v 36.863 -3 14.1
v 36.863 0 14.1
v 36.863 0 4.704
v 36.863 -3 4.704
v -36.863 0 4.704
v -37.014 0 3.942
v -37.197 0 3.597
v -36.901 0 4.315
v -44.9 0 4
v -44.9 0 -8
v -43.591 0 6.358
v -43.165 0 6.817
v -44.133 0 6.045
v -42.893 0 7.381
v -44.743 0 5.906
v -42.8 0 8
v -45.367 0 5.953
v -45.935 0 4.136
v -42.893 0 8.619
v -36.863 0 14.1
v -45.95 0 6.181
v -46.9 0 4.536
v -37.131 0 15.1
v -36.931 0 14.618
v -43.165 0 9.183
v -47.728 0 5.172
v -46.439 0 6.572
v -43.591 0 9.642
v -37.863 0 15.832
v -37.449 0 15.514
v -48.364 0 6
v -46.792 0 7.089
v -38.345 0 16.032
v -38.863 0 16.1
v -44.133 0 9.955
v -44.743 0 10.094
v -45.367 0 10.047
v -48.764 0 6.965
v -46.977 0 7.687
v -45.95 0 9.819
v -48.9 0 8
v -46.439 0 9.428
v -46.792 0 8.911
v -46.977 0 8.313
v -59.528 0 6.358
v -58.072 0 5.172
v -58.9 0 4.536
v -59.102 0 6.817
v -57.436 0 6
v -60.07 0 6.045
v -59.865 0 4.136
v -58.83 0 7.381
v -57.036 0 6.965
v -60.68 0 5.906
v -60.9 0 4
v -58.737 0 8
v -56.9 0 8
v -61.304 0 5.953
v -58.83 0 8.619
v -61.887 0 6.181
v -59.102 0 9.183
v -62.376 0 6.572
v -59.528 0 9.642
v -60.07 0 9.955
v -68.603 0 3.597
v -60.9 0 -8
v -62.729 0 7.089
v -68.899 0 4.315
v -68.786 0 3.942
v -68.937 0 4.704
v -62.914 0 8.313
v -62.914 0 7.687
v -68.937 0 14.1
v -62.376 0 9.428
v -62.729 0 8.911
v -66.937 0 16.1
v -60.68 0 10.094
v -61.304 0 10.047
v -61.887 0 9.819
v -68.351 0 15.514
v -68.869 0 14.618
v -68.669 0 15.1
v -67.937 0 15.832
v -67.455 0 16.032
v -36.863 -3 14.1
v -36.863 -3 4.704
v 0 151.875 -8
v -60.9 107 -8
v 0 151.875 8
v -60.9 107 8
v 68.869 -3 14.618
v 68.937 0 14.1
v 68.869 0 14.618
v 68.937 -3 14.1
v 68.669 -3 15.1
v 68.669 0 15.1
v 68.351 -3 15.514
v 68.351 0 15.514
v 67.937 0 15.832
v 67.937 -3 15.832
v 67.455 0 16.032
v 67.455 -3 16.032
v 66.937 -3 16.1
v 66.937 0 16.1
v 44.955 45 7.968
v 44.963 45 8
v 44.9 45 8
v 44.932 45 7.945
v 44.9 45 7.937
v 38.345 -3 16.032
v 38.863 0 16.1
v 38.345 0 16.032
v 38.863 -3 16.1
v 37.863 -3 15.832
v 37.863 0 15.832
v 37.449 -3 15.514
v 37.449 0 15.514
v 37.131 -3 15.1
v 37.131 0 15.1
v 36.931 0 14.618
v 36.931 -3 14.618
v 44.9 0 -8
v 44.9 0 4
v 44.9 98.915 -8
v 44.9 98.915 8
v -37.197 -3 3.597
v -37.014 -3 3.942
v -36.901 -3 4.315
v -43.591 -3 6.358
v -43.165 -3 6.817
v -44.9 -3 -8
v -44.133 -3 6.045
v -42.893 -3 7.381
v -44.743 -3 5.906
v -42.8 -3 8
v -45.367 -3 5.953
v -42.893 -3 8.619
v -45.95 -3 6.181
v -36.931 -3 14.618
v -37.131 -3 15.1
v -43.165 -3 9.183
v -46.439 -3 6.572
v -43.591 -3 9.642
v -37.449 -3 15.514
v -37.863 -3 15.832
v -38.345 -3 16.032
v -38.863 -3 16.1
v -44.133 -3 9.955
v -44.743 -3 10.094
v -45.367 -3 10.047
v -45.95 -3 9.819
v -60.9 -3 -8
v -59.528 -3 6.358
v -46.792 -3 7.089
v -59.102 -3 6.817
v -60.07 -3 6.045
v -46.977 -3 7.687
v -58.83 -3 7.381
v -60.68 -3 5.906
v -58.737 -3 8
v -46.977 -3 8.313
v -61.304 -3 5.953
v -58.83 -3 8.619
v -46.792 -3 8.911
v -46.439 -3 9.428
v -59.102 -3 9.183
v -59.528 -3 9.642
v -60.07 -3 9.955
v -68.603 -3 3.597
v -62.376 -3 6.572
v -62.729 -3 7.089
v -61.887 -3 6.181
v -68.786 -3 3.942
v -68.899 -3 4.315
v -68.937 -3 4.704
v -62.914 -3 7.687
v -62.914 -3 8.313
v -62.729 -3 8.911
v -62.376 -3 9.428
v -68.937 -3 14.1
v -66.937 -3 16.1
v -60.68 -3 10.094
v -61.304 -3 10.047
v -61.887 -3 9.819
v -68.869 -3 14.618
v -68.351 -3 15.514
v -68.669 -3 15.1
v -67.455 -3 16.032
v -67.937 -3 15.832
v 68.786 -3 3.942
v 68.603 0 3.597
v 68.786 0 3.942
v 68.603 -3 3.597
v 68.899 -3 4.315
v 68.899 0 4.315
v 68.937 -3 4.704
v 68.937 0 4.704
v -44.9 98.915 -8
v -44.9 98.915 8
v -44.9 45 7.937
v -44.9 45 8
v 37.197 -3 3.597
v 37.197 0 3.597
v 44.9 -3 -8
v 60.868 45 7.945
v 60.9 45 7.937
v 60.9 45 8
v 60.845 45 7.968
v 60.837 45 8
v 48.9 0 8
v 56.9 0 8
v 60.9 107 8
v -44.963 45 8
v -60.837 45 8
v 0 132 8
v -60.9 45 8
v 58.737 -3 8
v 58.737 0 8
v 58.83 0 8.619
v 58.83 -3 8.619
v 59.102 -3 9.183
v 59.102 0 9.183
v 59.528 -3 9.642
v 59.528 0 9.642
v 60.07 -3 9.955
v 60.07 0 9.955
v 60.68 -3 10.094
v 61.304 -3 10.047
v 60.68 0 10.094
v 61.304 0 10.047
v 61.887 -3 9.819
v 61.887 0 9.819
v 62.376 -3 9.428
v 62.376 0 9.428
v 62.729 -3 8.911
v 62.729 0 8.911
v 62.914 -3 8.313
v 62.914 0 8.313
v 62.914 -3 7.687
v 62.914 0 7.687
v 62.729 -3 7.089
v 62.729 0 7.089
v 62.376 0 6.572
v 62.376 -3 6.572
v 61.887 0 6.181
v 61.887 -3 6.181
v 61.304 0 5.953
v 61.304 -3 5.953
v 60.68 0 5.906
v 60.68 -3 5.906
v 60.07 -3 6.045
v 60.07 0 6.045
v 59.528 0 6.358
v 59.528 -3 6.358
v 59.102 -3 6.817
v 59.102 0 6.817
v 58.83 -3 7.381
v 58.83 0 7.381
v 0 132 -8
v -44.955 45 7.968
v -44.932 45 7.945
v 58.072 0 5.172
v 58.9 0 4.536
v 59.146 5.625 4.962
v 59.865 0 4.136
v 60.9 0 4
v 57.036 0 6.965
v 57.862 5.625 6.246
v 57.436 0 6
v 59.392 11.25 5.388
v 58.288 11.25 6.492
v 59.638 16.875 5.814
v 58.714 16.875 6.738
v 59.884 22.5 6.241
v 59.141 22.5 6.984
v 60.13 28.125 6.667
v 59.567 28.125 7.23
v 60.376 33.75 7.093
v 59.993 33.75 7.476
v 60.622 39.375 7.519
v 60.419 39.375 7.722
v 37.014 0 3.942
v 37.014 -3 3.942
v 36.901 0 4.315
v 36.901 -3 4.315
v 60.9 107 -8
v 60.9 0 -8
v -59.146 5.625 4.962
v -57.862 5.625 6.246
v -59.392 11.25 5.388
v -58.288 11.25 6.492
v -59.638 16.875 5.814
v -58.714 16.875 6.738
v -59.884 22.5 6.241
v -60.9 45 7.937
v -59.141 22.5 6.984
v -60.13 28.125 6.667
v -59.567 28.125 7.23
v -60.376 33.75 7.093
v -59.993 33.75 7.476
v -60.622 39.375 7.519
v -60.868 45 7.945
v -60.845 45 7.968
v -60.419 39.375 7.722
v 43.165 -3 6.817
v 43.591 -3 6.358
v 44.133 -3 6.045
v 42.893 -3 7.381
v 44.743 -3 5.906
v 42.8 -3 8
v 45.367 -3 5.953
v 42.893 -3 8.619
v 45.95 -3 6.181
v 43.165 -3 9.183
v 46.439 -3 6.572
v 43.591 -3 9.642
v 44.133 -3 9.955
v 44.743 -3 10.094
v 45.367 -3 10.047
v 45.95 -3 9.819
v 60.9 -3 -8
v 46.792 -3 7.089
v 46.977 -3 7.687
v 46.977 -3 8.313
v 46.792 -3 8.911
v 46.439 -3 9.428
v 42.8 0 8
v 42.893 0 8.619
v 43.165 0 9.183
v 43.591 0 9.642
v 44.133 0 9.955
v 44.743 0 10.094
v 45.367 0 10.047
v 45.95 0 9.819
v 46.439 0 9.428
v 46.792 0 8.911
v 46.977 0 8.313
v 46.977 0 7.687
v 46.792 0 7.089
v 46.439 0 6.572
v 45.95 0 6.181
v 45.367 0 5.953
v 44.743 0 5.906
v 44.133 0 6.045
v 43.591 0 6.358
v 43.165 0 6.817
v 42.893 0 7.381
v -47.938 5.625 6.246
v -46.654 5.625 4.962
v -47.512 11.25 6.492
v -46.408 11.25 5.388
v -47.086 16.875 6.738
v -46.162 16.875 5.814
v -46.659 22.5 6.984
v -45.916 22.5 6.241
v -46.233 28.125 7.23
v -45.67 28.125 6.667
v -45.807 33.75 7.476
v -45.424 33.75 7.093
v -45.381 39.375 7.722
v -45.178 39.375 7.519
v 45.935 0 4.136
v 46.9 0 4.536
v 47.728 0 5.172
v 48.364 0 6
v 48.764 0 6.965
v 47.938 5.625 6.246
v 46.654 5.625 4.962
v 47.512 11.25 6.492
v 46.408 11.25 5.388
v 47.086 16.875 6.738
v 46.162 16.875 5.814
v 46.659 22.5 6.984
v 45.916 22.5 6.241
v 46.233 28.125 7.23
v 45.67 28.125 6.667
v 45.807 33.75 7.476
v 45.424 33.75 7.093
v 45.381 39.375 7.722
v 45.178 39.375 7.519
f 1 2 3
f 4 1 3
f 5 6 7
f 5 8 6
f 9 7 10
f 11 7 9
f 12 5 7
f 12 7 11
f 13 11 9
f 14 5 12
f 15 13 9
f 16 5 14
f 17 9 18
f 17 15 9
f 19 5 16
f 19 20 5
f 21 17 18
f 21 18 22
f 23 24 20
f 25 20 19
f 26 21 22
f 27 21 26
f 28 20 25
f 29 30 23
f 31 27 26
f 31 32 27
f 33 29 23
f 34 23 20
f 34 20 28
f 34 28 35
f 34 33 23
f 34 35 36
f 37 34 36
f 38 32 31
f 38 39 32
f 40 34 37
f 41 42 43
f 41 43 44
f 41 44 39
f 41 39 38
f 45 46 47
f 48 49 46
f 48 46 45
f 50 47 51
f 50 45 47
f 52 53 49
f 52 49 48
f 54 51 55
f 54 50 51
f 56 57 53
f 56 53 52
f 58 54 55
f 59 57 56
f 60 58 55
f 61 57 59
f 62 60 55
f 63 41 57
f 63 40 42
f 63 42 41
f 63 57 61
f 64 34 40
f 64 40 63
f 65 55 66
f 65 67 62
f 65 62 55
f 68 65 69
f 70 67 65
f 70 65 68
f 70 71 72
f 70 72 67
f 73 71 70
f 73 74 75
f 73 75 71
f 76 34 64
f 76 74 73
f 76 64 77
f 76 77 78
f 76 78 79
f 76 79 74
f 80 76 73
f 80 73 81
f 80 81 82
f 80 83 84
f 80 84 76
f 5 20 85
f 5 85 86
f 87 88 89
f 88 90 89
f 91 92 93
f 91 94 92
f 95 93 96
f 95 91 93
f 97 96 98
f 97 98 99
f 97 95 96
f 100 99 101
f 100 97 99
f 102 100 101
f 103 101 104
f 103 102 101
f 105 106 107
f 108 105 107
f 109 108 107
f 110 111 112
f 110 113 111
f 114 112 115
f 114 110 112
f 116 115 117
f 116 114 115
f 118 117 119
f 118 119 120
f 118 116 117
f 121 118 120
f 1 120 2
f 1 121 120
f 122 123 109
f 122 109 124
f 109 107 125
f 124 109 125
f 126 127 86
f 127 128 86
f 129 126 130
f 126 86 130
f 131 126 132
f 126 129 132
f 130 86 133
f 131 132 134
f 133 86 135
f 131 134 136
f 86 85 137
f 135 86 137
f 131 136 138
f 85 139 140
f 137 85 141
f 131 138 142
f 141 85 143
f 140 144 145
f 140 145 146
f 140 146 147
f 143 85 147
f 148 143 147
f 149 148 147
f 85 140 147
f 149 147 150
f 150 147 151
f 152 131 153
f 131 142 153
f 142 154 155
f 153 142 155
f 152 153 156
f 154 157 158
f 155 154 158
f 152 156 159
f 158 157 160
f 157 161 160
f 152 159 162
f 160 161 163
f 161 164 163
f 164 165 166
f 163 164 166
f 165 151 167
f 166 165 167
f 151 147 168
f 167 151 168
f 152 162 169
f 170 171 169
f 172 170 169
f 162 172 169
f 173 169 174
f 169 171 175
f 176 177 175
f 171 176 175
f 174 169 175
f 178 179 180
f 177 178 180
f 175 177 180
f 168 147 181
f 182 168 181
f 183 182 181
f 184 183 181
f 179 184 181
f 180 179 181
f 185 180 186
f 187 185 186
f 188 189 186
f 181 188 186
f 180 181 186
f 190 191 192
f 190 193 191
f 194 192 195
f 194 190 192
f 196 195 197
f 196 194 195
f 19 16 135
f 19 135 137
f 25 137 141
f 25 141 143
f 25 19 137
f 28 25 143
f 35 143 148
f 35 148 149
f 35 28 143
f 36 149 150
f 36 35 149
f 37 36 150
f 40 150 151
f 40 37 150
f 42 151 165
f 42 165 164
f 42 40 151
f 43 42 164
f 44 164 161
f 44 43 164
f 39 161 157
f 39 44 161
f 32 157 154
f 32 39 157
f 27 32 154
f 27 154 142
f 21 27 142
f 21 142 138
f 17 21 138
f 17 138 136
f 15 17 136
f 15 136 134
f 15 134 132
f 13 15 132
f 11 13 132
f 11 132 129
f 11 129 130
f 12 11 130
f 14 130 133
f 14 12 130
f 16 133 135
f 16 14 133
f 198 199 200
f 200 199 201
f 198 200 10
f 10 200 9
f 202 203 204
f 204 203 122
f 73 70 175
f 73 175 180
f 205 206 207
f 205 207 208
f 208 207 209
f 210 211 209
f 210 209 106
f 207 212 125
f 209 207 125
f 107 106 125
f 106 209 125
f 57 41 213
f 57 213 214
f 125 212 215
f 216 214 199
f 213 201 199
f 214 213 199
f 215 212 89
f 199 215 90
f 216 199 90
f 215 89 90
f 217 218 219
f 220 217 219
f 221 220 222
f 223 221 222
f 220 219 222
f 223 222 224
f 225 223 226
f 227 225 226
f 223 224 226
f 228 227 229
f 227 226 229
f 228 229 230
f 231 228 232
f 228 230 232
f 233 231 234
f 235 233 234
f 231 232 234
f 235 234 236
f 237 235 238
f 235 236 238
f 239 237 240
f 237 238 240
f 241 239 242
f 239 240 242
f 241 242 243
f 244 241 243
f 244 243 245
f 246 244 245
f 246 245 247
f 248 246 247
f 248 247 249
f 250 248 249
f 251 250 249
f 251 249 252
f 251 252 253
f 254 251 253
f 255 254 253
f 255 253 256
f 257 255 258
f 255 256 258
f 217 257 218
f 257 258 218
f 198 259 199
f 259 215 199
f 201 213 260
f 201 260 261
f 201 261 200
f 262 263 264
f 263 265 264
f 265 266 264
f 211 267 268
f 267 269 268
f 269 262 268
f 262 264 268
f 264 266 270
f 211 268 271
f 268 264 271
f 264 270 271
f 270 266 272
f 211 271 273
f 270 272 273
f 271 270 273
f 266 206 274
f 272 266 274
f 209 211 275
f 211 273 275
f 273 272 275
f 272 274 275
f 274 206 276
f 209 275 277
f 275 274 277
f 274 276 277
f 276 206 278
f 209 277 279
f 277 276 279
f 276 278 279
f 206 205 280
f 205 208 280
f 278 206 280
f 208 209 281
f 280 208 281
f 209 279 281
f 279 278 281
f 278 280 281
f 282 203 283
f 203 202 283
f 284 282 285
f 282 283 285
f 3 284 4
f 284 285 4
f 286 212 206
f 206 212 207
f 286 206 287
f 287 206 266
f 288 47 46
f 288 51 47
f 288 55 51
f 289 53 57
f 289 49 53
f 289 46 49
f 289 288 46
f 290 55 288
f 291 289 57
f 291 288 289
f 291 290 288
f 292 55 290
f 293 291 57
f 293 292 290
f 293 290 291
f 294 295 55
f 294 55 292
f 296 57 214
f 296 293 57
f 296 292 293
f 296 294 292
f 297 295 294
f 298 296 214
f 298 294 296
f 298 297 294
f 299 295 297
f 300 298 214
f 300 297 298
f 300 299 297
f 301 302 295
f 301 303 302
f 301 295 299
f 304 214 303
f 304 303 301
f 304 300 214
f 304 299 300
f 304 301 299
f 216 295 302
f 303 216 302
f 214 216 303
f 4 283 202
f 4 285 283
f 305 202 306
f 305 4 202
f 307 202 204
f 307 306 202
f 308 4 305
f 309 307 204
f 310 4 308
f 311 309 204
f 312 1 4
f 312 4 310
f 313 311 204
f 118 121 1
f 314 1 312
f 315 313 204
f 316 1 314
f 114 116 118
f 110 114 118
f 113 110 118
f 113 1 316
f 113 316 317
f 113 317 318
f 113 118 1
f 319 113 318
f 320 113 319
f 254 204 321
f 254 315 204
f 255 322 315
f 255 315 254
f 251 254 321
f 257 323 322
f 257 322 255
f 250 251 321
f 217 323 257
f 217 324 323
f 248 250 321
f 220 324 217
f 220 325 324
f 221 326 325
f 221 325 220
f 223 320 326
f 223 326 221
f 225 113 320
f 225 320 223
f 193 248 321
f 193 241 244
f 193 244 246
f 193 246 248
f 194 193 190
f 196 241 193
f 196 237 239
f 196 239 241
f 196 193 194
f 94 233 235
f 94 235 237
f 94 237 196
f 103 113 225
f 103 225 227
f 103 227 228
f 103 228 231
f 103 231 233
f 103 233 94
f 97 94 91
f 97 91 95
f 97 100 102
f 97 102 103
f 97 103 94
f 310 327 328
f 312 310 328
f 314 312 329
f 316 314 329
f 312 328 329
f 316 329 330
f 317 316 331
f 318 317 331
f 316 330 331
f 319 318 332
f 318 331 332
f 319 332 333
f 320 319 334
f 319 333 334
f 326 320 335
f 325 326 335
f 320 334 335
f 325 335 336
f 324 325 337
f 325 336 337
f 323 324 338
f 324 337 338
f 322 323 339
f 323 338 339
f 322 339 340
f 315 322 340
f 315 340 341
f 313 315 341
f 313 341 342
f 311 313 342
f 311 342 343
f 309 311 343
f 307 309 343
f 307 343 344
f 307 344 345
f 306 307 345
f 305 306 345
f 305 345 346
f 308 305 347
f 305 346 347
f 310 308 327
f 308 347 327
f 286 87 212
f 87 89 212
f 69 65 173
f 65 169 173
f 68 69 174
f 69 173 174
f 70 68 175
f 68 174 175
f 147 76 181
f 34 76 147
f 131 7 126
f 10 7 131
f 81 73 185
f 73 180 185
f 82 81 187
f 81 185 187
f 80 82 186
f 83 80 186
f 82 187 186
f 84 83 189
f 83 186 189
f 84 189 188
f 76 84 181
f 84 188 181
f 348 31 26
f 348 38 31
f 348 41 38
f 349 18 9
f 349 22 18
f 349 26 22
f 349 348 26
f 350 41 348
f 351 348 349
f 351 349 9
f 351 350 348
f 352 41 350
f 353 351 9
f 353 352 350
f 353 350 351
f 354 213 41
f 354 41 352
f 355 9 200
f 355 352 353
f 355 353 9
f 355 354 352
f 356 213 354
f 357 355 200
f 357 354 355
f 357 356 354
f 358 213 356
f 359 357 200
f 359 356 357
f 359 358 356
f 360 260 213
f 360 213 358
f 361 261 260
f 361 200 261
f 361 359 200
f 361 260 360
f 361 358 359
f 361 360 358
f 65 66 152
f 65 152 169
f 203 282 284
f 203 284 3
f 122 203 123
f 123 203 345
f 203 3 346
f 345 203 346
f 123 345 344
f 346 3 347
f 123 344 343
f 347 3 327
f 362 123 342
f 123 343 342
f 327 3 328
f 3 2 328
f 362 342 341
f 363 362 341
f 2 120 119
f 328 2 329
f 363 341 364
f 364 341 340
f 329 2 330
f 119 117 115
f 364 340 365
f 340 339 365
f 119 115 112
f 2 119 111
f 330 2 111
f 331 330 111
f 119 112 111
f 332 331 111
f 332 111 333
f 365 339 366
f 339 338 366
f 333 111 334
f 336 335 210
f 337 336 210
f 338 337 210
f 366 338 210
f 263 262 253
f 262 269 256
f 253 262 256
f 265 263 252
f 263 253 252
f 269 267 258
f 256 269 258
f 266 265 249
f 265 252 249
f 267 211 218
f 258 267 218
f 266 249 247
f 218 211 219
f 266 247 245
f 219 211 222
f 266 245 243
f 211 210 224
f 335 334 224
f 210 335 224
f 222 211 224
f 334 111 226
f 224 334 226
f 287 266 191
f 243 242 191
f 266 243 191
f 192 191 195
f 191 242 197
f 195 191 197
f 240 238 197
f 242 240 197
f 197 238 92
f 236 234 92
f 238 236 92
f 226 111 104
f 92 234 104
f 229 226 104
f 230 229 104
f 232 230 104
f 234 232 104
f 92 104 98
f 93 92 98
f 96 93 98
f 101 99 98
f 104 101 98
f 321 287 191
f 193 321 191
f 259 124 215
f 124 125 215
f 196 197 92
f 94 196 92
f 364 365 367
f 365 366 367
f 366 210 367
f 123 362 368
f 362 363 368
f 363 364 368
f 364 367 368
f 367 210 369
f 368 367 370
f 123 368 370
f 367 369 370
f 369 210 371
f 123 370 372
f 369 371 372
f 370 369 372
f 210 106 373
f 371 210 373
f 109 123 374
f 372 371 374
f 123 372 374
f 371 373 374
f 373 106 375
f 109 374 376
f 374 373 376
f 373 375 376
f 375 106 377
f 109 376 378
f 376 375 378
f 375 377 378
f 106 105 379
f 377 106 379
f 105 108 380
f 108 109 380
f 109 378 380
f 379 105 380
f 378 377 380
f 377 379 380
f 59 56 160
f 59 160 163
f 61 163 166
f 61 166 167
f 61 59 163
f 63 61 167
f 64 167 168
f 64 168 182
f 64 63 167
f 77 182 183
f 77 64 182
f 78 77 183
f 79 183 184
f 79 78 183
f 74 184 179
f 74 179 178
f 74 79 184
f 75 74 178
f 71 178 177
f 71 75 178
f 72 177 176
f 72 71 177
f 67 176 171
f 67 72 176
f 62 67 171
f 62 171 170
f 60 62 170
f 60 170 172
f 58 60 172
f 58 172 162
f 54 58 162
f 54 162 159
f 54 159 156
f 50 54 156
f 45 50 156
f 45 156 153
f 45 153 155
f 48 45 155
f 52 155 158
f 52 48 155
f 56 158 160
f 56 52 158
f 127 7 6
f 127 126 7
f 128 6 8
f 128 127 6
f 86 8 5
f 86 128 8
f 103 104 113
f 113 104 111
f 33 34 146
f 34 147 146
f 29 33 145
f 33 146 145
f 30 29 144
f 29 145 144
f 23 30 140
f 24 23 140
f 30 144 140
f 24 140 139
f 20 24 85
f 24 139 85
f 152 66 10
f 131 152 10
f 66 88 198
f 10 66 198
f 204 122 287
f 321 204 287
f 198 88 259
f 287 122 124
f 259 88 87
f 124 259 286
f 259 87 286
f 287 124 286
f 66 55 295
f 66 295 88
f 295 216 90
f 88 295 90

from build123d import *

# Parameters (mm, degrees)
BOSS_EXTRUDE1_DEPTH  = 8
SKETCH2_R            = 4
CUT_EXTRUDE1_DEPTH   = 45
CUT_EXTRUDE1_TAPER   = 5
SKETCH3_R            = 2.1
BOSS_EXTRUDE2_DEPTH  = 3
FILLET1_R            = 2
FILLET1_OF_MIRROR1_R = 2


with BuildPart() as part:
    # Sketch1 → Boss-Extrude1 (new body, symmetric)
    with BuildSketch(Plane.XY):
        Polygon((-60.9, 0), (-60.9, 107), (0, 151.8745296), (60.9, 107), (60.9, 0), (44.9, 0), (44.9, 98.91516619), (0, 132), (-44.9, 98.91516619), (-44.9, 0), align=None)
    extrude(amount=BOSS_EXTRUDE1_DEPTH, both=True)

    # Sketch2 → Cut-Extrude1 (cut)
    with BuildSketch(Plane.XZ):
        with Locations((-60.9, 8)):
            Circle(SKETCH2_R)
        with Locations((-44.9, 8)):
            Circle(SKETCH2_R)
    cut_extrude1 = extrude(amount=-CUT_EXTRUDE1_DEPTH, taper=CUT_EXTRUDE1_TAPER, mode=Mode.SUBTRACT)

    # Sketch3 → Boss-Extrude2 (add)
    with BuildSketch(Plane.XZ):
        Polygon((-60.9, -8), (-68.936989859, 4.1), (-68.936989859, 16.1), (-36.863010141, 16.1), (-36.863010141, 4.1), (-44.9, -8), align=None)
        with Locations((-60.836989859, 8)):
            Circle(SKETCH3_R, mode=Mode.SUBTRACT)
        with Locations((-44.9, 8)):
            Circle(SKETCH3_R, mode=Mode.SUBTRACT)
    boss_extrude2 = extrude(amount=BOSS_EXTRUDE2_DEPTH)

    # Fillet1
    fillet1_edges = [part.edges().sort_by_distance(p)[0] for p in [
        (-36.863010141, -1.5, 4.1),
        (-36.863010141, -1.5, 16.1),
        (-68.936989859, -1.5, 16.1),
        (-68.936989859, -1.5, 4.1),
    ]]
    fillet(fillet1_edges, radius=FILLET1_R)

    # Mirror1: Cut-Extrude1, Boss-Extrude2 across plane
    add(cut_extrude1.mirror(Plane(origin=(0, 0, 0), x_dir=(0, 0, 1), z_dir=(1, 0, 0))), mode=Mode.SUBTRACT)
    add(boss_extrude2.mirror(Plane(origin=(0, 0, 0), x_dir=(0, 0, 1), z_dir=(1, 0, 0))))

    # Fillet1 of Mirror1
    fillet1_of_mirror1_edges = [part.edges().sort_by_distance(p)[0] for p in [
        (36.863010141, -1.5, 4.1),
        (36.863010141, -1.5, 16.1),
        (68.936989859, -1.5, 16.1),
        (68.936989859, -1.5, 4.1),
    ]]
    fillet(fillet1_of_mirror1_edges, radius=FILLET1_OF_MIRROR1_R)


solid = part.part
